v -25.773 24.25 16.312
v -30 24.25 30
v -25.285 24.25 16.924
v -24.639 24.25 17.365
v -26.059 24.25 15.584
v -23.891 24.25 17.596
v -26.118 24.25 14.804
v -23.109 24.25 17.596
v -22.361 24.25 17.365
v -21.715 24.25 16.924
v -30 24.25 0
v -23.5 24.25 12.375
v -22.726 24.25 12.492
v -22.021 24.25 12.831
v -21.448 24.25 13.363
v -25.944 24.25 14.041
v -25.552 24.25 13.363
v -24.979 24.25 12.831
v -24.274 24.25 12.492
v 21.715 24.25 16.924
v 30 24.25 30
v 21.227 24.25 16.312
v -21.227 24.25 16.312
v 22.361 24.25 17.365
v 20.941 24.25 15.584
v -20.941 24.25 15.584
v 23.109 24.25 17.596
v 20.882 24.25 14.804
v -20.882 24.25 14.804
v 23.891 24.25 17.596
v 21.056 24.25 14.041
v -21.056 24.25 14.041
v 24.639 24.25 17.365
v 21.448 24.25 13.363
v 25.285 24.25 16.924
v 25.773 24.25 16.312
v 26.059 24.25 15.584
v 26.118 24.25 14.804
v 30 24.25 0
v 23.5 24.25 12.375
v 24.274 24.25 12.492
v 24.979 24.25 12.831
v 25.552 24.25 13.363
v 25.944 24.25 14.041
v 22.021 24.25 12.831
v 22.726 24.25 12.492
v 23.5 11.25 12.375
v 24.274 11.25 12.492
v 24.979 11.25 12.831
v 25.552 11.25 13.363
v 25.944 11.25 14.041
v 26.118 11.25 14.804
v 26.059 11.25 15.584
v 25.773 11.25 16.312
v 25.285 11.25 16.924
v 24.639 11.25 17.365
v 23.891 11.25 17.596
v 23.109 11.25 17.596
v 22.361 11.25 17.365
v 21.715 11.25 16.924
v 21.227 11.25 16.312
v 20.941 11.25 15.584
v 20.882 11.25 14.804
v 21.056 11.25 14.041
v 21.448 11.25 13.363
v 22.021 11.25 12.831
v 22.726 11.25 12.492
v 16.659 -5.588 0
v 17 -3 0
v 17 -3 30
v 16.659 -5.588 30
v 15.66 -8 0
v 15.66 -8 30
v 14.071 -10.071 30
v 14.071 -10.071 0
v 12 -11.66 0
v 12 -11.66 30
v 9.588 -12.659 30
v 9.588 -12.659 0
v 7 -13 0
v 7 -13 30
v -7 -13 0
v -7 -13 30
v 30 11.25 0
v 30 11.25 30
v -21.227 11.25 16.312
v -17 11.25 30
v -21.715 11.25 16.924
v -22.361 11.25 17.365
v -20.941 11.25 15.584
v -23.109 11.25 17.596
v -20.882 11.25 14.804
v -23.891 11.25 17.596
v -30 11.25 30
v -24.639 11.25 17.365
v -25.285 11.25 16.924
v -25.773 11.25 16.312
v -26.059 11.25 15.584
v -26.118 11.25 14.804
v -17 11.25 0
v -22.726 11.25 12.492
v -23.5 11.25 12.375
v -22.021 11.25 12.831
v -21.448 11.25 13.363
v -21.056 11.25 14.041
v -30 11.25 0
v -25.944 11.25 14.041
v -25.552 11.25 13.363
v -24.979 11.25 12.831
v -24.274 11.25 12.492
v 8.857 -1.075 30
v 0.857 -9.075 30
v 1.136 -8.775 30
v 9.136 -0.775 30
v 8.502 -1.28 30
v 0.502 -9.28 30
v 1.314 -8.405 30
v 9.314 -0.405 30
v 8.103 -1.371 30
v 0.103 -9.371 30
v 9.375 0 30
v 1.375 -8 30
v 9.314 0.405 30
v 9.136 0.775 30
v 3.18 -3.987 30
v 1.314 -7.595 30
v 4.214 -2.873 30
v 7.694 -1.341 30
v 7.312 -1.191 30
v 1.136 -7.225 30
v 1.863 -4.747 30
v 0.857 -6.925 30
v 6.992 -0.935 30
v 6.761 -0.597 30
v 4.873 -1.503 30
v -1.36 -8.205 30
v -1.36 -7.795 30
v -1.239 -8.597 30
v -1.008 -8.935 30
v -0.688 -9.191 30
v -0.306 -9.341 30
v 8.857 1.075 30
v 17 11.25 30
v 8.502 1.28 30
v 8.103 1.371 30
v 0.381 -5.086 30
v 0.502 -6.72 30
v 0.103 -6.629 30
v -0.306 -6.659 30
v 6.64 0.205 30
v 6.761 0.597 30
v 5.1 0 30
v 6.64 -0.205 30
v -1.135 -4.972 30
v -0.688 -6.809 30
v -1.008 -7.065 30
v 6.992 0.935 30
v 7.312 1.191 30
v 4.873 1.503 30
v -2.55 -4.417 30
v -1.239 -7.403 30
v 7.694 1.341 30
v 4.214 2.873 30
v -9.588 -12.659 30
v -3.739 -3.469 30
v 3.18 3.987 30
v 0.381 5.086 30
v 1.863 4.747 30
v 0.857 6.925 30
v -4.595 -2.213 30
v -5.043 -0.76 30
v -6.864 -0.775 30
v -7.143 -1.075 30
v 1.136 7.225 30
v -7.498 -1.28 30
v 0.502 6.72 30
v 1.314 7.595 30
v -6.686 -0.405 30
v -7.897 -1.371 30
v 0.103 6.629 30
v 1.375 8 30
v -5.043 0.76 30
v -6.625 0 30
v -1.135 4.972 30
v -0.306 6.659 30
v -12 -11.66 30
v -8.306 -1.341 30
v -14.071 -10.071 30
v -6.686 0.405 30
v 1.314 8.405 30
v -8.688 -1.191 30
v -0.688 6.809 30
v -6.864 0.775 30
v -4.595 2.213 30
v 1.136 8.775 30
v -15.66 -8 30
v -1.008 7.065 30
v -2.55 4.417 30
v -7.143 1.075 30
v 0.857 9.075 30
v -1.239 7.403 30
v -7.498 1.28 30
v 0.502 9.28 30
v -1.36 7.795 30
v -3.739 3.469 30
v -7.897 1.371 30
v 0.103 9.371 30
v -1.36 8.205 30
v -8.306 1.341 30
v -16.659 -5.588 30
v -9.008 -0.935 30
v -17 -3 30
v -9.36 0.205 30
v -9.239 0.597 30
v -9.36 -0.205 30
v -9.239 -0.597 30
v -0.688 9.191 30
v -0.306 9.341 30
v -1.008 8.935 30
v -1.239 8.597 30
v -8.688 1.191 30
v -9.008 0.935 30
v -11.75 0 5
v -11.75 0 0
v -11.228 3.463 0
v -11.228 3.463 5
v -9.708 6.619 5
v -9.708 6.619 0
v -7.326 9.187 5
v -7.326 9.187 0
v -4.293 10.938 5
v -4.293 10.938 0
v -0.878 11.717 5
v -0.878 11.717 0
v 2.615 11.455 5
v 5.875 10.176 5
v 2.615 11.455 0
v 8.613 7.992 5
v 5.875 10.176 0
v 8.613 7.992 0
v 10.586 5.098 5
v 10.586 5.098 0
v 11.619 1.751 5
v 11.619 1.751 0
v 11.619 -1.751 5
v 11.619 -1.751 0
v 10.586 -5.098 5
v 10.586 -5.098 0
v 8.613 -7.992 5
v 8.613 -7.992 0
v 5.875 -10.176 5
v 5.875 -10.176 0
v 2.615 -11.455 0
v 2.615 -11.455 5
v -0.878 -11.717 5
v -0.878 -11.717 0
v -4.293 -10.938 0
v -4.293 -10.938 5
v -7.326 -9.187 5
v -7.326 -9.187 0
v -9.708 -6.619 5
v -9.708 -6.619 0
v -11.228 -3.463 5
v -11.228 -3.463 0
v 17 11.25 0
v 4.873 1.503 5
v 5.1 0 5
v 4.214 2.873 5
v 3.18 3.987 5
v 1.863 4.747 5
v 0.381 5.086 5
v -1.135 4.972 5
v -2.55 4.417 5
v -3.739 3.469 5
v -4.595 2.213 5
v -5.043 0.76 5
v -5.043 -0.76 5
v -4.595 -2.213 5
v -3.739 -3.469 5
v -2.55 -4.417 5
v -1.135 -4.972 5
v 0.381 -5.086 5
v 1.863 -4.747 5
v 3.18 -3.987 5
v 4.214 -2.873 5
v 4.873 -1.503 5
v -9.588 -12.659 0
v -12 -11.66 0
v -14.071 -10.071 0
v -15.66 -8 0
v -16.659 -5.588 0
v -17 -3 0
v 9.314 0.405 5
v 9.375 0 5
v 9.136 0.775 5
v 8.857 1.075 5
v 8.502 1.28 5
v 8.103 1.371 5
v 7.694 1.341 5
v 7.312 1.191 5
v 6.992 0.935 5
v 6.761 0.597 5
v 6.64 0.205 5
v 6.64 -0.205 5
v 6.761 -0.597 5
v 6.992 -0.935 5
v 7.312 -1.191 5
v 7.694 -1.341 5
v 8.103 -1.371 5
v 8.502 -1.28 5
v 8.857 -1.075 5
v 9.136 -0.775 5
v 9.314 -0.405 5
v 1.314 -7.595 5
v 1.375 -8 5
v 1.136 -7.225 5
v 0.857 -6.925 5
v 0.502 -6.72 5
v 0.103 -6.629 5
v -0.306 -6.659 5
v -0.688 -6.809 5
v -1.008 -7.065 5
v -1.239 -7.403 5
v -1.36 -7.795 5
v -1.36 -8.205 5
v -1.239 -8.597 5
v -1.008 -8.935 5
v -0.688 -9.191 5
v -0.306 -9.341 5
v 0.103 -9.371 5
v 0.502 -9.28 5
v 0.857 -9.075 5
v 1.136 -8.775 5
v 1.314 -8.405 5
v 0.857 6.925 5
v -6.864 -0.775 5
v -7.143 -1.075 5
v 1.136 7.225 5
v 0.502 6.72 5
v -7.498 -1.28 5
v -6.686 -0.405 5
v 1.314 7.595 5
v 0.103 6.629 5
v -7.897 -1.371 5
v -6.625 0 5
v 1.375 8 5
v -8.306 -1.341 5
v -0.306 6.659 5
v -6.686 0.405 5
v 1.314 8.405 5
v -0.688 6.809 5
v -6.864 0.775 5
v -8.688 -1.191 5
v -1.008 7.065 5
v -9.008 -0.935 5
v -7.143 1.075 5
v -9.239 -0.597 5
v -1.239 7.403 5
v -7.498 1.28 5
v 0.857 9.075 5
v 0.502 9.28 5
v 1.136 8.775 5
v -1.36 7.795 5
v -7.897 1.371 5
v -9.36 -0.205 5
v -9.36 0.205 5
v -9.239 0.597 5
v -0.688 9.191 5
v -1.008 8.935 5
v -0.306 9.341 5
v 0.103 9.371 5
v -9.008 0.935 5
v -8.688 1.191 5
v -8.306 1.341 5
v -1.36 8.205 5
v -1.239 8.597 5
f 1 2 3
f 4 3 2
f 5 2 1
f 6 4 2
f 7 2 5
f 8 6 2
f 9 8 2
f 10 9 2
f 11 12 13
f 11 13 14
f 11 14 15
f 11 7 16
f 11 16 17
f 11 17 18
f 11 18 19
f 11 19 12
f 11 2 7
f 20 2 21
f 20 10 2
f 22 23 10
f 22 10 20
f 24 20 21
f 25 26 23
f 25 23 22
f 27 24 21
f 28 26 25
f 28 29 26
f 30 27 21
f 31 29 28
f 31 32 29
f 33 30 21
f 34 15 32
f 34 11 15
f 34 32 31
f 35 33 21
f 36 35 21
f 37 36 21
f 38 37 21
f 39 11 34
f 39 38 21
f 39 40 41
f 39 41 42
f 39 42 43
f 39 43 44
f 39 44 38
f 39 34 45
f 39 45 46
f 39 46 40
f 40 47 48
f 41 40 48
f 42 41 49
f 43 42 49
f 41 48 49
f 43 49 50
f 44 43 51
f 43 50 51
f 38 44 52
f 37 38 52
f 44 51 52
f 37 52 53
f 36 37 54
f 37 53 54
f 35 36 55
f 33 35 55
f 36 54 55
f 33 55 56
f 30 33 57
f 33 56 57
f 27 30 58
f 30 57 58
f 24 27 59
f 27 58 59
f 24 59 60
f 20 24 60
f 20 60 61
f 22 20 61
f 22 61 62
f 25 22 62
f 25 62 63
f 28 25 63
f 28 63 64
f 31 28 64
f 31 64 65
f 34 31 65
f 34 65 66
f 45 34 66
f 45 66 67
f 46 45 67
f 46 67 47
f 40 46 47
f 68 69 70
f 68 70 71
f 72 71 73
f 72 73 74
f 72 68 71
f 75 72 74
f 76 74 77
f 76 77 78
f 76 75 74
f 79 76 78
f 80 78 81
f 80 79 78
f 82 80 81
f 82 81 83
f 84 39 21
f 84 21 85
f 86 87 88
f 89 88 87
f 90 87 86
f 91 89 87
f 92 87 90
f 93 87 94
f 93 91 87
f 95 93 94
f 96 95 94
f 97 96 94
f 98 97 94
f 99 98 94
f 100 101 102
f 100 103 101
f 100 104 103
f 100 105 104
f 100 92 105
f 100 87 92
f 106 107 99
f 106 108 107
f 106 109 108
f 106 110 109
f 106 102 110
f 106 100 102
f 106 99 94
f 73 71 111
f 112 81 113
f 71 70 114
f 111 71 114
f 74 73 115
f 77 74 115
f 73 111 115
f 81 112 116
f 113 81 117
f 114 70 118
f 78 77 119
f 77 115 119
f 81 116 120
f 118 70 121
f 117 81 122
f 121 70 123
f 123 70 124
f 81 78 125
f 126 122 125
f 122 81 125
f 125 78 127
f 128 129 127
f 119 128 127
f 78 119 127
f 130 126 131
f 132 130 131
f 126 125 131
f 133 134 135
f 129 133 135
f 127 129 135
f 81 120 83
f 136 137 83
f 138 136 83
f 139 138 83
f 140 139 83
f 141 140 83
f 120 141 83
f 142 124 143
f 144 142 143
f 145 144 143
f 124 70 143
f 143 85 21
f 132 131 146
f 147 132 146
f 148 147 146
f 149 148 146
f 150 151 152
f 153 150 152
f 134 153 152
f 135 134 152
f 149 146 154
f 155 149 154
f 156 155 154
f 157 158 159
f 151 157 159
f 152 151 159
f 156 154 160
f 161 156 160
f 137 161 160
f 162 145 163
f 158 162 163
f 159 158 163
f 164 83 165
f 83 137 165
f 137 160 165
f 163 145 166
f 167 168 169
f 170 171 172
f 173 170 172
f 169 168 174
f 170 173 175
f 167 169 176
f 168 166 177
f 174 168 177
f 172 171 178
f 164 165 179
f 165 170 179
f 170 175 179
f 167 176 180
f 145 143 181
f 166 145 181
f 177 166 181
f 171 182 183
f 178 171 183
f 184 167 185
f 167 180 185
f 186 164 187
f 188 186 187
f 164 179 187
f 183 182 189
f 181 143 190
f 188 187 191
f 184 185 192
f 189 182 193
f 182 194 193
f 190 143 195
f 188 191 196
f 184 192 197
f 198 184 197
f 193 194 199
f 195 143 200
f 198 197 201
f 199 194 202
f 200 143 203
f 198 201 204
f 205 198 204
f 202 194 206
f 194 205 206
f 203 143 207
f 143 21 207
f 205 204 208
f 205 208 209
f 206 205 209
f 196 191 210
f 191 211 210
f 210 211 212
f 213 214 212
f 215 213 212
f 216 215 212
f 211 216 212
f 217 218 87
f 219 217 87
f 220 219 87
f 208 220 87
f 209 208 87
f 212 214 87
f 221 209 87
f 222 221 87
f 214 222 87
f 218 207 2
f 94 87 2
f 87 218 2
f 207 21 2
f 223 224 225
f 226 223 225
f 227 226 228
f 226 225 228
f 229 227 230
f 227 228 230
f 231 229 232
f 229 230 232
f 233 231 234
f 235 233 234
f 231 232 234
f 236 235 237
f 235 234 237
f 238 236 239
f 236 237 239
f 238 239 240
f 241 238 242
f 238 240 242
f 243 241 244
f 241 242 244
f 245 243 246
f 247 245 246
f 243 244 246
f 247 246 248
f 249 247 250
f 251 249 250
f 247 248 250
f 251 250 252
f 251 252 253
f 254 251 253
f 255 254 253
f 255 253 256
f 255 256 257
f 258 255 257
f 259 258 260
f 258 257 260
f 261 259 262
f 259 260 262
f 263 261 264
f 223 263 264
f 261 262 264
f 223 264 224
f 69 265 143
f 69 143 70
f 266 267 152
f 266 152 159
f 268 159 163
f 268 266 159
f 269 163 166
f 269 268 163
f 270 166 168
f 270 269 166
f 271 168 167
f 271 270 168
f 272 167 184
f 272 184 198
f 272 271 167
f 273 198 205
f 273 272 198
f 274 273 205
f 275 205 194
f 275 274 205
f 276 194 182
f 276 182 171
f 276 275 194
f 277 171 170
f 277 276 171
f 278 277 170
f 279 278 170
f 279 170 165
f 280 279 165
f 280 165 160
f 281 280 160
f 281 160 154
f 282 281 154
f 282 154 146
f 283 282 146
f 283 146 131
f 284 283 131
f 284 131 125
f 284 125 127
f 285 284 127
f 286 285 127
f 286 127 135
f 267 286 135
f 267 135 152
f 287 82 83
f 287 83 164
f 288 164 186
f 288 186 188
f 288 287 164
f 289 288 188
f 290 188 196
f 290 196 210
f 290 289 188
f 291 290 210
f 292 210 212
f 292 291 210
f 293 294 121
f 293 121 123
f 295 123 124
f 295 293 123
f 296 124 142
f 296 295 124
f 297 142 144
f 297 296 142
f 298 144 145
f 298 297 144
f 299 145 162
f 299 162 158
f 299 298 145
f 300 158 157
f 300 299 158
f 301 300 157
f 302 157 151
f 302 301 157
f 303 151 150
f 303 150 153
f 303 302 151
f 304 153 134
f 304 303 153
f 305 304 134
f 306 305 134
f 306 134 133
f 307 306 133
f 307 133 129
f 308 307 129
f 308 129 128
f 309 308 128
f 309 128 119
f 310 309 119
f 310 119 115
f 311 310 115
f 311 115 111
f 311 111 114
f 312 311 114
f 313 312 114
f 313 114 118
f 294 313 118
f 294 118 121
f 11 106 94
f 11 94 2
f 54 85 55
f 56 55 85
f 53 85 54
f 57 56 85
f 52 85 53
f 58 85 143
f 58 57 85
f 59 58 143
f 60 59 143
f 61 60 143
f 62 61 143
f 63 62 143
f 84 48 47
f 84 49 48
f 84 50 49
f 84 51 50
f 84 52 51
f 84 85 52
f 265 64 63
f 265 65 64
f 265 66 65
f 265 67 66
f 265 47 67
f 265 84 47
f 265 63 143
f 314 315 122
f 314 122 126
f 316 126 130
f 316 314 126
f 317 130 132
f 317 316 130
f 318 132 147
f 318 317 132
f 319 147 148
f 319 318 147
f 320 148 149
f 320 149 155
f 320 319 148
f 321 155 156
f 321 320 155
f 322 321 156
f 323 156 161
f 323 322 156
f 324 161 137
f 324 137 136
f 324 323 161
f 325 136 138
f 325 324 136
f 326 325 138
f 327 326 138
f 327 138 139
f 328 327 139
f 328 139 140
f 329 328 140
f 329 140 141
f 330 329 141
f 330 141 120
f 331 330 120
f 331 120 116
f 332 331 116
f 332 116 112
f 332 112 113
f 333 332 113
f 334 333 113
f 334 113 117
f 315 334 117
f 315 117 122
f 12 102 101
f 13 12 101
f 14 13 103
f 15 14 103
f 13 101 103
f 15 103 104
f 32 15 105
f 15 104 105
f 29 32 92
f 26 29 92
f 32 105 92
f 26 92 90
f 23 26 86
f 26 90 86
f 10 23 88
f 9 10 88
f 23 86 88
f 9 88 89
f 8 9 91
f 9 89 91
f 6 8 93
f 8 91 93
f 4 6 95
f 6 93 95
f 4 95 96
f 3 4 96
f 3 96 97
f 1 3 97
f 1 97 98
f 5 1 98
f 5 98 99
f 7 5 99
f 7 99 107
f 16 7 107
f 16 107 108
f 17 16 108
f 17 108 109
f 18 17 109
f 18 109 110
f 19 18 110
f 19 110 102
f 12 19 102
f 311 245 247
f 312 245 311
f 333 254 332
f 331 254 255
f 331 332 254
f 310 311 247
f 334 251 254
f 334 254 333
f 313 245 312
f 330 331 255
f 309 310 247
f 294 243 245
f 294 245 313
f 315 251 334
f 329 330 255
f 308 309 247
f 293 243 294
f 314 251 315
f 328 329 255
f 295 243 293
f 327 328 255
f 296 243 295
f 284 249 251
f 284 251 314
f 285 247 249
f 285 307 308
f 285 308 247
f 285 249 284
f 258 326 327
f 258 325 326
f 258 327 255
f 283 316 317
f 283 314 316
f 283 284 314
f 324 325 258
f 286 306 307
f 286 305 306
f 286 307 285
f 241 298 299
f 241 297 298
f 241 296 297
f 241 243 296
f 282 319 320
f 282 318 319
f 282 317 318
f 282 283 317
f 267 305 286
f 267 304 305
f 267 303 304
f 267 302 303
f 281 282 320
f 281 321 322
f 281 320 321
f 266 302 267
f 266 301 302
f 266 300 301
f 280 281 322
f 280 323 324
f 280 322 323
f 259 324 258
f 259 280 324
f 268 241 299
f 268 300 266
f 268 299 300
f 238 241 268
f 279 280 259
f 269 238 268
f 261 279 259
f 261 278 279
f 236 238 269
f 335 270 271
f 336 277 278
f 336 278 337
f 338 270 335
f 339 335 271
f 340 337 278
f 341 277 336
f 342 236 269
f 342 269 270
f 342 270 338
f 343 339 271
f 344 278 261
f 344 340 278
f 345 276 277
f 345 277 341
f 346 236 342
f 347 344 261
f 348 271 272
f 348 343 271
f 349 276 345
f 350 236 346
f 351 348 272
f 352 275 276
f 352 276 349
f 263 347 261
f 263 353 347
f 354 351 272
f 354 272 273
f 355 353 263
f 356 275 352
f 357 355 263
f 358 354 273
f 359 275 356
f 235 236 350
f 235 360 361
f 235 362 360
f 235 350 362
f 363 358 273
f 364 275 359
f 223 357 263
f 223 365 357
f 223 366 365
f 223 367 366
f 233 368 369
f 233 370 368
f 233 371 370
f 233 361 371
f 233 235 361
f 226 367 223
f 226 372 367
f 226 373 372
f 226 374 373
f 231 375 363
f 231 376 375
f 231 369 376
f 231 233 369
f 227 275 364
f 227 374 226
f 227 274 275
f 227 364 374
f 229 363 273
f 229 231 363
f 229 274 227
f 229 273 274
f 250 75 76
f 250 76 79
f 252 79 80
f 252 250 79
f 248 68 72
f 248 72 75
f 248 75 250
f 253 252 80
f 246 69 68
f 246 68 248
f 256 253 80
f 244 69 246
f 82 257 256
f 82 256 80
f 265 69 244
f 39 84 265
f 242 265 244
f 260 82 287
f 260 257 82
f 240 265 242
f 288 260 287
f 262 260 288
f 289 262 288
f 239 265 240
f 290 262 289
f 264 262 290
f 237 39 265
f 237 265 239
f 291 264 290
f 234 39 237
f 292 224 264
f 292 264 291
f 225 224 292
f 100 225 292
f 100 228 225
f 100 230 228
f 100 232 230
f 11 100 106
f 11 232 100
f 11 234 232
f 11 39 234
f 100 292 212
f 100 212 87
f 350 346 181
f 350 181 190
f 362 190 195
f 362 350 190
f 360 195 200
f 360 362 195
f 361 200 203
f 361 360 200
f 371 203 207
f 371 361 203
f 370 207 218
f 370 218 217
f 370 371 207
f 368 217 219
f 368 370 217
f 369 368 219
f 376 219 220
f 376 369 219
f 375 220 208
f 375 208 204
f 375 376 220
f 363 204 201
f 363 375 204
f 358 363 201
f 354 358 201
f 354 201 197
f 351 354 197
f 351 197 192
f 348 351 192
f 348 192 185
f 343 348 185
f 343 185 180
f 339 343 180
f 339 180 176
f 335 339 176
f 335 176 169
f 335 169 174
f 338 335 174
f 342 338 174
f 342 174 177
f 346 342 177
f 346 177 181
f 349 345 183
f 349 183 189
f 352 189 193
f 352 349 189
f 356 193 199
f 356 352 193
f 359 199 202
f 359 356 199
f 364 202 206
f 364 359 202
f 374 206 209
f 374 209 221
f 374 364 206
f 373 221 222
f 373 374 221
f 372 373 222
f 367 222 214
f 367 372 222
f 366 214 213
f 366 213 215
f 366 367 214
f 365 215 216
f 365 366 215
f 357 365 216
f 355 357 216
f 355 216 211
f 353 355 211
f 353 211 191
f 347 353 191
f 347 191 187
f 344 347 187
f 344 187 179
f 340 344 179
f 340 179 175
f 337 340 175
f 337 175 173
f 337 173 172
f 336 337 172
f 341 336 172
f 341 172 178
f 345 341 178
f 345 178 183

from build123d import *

# Parameters (mm, degrees)
CROQUIS1_R              = 5.1
CROQUIS1_R_2            = 1.375
SALIENTE_EXTRUIR1_DEPTH = 30
CROQUIS2_R              = 11.75
CORTAR_EXTRUIR1_DEPTH   = 5
CROQUIS3_R              = 2.625
CORTAR_EXTRUIR2_DEPTH   = 49.867806376


with BuildPart() as part:
    # Croquis1 → Saliente-Extruir1 (new body)
    with BuildSketch(Plane.XY):
        with BuildLine():
            Line((-30, 24.25), (30, 24.25))
            Line((30, 24.25), (30, 11.25))
            Line((30, 11.25), (17, 11.25))
            Line((17, 11.25), (17, -3))
            ThreePointArc((17, -3), (14.071067812, -10.071067812), (7, -13))
            Line((7, -13), (-7, -13))
            ThreePointArc((-7, -13), (-14.071067812, -10.071067812), (-17, -3))
            Line((-17, -3), (-17, 11.25))
            Line((-17, 11.25), (-30, 11.25))
            Line((-30, 11.25), (-30, 24.25))
        make_face()
        Circle(CROQUIS1_R, mode=Mode.SUBTRACT)
        with Locations((0, 8)):
            Circle(CROQUIS1_R_2, mode=Mode.SUBTRACT)
        with Locations((8, 0)):
            Circle(CROQUIS1_R_2, mode=Mode.SUBTRACT)
        with Locations((0, -8)):
            Circle(CROQUIS1_R_2, mode=Mode.SUBTRACT)
        with Locations((-8, 0)):
            Circle(CROQUIS1_R_2, mode=Mode.SUBTRACT)
    extrude(amount=SALIENTE_EXTRUIR1_DEPTH)

    # Croquis2 → Cortar-Extruir1 (cut)
    with BuildSketch(Plane(origin=(0, 0, 0), x_dir=(-1, 0, 0), z_dir=(0, 0, -1))):
        Circle(CROQUIS2_R)
    extrude(amount=-CORTAR_EXTRUIR1_DEPTH, mode=Mode.SUBTRACT)

    # Croquis3 → Cortar-Extruir2 (cut, through all)
    with BuildSketch(Plane.XZ.offset(-11.25)):
        with Locations(Location((-23.5, 15, 0), (0, 0, 270))):
            Circle(CROQUIS3_R)
        with Locations(Location((23.5, 15, 0), (0, 0, 270))):
            Circle(CROQUIS3_R)
    extrude(amount=-CORTAR_EXTRUIR2_DEPTH, mode=Mode.SUBTRACT)


solid = part.part
